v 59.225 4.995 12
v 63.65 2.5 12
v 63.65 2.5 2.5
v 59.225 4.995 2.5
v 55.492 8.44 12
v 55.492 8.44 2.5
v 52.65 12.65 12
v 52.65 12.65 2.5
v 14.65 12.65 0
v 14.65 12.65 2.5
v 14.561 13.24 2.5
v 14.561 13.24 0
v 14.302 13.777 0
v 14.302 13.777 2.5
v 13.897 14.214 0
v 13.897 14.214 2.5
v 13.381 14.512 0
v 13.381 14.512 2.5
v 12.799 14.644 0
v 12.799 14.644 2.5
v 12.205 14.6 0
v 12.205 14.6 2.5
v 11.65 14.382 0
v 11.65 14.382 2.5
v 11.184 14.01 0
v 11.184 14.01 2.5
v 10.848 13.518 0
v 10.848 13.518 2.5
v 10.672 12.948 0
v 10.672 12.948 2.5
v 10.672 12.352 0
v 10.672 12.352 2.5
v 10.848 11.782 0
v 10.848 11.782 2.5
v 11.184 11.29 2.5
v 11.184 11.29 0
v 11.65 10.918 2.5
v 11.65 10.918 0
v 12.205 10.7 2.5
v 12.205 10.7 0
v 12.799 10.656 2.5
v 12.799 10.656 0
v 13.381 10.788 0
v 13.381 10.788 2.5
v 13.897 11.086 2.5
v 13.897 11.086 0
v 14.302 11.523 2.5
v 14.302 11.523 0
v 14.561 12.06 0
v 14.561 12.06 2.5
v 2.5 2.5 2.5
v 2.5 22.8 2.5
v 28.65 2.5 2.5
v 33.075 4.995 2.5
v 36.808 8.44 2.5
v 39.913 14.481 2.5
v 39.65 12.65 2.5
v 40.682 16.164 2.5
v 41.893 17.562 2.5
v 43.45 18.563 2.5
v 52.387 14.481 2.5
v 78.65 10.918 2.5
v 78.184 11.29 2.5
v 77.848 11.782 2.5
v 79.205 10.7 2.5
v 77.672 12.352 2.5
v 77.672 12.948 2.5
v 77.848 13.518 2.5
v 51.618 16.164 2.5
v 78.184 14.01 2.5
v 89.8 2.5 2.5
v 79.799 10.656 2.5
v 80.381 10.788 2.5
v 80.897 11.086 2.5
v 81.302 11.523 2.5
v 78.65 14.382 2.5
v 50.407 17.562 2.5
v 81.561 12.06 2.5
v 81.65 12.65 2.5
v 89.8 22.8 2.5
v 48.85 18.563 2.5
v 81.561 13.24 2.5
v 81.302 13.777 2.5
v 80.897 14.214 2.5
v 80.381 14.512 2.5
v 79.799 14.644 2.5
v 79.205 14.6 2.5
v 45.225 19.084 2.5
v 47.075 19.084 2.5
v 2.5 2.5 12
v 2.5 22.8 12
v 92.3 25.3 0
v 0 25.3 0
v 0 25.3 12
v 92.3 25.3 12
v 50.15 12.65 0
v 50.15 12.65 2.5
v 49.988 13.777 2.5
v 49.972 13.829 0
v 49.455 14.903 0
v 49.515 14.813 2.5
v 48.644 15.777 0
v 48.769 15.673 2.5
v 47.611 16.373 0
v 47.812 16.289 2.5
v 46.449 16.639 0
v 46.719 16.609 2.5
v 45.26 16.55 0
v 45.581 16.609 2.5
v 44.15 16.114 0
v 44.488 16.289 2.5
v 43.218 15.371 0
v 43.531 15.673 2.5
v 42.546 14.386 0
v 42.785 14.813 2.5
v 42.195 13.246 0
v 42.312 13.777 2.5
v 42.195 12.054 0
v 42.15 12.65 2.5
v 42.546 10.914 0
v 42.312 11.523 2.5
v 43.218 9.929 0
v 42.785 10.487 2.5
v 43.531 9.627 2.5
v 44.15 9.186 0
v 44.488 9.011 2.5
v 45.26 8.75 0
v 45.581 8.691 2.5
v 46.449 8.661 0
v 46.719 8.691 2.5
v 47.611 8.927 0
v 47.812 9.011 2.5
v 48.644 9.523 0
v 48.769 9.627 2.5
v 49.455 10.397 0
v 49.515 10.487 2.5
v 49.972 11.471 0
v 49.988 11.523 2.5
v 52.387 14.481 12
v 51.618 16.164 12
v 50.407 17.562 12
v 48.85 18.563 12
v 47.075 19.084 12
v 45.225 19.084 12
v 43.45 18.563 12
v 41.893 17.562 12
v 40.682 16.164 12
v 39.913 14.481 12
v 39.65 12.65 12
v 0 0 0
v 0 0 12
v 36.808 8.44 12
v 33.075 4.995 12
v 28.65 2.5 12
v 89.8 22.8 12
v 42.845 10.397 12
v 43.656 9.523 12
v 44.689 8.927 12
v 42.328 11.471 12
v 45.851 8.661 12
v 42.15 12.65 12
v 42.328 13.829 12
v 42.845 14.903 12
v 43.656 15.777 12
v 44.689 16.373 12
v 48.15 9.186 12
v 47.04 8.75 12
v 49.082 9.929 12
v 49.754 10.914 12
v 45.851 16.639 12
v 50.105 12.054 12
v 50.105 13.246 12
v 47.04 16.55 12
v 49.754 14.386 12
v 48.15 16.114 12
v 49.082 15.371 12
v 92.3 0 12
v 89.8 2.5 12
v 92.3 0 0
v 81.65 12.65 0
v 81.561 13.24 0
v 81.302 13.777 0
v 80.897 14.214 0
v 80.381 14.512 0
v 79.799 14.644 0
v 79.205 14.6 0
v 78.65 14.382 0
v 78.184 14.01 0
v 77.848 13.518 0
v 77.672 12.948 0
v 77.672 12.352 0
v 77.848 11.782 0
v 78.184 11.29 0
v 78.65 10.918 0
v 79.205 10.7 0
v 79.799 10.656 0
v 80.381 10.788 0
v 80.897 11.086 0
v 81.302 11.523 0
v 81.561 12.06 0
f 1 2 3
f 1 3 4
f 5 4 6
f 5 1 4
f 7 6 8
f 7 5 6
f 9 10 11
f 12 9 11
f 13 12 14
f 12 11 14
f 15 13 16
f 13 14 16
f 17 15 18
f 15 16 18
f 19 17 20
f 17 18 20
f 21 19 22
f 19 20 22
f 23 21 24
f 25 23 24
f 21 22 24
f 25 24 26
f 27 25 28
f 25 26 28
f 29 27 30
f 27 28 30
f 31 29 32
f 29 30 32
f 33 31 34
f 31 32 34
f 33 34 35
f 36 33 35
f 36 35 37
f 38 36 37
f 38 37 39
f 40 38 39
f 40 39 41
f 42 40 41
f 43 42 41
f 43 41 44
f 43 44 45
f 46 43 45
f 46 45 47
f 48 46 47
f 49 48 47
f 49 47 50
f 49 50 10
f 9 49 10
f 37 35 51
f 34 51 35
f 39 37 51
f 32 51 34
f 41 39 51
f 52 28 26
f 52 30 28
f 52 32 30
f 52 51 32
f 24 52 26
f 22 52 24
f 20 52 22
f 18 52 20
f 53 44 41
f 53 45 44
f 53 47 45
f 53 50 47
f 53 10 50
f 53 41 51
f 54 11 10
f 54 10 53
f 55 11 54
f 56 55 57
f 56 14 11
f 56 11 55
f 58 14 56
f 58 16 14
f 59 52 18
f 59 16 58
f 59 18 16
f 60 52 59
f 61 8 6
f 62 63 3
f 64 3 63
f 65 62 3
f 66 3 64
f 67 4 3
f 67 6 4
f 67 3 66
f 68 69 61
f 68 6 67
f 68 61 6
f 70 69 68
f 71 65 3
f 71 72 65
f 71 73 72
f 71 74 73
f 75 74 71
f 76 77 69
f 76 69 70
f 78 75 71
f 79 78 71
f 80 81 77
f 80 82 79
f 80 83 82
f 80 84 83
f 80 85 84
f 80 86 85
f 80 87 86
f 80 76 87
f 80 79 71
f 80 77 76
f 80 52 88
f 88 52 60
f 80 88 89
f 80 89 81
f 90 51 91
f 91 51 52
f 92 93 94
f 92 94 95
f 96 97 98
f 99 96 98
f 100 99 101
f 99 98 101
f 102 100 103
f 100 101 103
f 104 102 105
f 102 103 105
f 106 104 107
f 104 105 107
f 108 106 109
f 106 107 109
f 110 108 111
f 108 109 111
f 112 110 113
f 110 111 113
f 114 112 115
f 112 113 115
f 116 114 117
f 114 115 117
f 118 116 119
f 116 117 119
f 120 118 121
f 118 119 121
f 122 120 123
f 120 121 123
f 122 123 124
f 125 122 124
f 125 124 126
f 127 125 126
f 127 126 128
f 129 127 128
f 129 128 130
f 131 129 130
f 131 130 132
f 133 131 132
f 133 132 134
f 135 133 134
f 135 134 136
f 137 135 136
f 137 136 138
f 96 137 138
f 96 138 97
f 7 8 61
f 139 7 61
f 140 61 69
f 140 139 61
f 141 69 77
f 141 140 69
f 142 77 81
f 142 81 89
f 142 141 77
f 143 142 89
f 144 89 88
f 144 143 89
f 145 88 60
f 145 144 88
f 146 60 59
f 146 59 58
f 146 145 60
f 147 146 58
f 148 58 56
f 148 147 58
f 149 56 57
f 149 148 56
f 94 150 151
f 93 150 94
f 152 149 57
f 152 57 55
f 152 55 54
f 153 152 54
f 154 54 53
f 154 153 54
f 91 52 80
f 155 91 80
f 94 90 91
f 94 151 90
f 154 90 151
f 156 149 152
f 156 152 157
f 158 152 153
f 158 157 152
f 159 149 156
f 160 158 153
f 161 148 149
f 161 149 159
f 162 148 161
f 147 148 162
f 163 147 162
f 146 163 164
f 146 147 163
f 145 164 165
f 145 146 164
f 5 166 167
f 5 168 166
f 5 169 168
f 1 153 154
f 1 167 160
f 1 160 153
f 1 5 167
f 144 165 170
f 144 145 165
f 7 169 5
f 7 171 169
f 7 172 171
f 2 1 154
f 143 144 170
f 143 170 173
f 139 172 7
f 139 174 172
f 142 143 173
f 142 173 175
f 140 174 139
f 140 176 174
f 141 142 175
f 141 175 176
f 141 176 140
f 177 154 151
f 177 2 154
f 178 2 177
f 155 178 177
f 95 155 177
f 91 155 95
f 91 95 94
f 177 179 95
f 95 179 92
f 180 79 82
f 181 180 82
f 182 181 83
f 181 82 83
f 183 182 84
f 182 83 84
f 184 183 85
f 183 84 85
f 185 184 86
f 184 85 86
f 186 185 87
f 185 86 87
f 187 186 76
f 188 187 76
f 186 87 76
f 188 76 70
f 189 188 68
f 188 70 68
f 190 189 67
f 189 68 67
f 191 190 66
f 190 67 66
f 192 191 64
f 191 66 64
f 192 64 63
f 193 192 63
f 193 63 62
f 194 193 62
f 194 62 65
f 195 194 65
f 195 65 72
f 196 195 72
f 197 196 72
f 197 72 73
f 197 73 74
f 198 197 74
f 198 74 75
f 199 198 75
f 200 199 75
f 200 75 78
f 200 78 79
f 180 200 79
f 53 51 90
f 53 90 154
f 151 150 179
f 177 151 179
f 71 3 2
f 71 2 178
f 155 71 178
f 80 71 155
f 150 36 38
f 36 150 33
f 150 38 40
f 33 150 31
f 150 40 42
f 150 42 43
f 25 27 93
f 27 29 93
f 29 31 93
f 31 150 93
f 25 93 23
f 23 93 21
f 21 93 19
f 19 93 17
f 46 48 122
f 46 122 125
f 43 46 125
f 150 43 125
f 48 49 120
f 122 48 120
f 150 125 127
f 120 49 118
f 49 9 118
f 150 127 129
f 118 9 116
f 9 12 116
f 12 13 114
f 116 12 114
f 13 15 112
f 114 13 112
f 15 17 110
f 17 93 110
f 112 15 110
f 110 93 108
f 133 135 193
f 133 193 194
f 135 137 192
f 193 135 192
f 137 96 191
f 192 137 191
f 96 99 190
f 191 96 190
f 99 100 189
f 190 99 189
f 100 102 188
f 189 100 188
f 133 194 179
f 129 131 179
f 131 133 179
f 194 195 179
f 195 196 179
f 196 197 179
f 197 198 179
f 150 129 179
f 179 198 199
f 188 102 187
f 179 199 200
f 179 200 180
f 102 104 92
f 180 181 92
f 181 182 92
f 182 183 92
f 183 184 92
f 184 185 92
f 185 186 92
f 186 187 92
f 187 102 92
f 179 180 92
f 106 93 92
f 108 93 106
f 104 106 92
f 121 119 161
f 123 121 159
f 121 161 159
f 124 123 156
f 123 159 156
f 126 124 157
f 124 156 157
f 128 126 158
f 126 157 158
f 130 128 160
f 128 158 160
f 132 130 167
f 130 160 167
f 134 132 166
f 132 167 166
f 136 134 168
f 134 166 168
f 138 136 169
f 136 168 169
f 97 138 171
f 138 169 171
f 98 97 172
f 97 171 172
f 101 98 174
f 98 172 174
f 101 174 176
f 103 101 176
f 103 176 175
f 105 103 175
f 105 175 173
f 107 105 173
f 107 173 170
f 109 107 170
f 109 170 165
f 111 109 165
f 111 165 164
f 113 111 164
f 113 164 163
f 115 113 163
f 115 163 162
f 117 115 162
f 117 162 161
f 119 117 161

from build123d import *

# Parameters (mm, degrees)
CROQUIS2_W              = 92.3
CROQUIS2_H              = 25.3
SALIENTE_EXTRUIR1_DEPTH = 12
VACIADO1_T              = -2.5
CROQUIS3_R              = 4
CROQUIS3_R_2            = 2
CORTAR_EXTRUIR1_DEPTH   = 12
SALIENTE_EXTRUIR2_START = 9.5
CROQUIS5_R              = 4
SALIENTE_EXTRUIR2_DEPTH = 9.5


with BuildPart() as part:
    # Croquis2 → Saliente-Extruir1 (new body)
    with BuildSketch(Plane.XY):
        with Locations((46.15, 12.65)):
            Rectangle(CROQUIS2_W, CROQUIS2_H)
    extrude(amount=SALIENTE_EXTRUIR1_DEPTH)

    # Vaciado1
    vaciado1_openings = [part.faces().sort_by_distance(p)[0] for p in [
        (46.15, 12.65, 12),
    ]]
    offset(amount=VACIADO1_T, openings=vaciado1_openings, kind=Kind.INTERSECTION)

    # Croquis3 → Cortar-Extruir1 (cut)
    with BuildSketch(Plane.XY.offset(2.5)):
        with Locations((46.15, 12.65)):
            Circle(CROQUIS3_R)
        with Locations((12.65, 12.65)):
            Circle(CROQUIS3_R_2)
        with Locations((79.65, 12.65)):
            Circle(CROQUIS3_R_2)
    extrude(amount=-CORTAR_EXTRUIR1_DEPTH, mode=Mode.SUBTRACT)

    # Croquis5 → Saliente-Extruir2 (add)
    with BuildSketch(Plane.XY.offset(2.5).offset(SALIENTE_EXTRUIR2_START)):
        with BuildLine():
            Line((28.65, 2.5), (63.65, 2.5))
            ThreePointArc((63.65, 2.5), (57.258552241, 6.60889898), (52.65, 12.65))
            ThreePointArc((52.65, 12.65), (46.15, 19.15), (39.65, 12.65))
            ThreePointArc((39.65, 12.65), (35.041447759, 6.60889898), (28.65, 2.5))
        make_face()
        with Locations(Location((46.15, 12.65, 0), (0, 0, 180))):
            Circle(CROQUIS5_R, mode=Mode.SUBTRACT)
    extrude(amount=-SALIENTE_EXTRUIR2_DEPTH)


solid = part.part
